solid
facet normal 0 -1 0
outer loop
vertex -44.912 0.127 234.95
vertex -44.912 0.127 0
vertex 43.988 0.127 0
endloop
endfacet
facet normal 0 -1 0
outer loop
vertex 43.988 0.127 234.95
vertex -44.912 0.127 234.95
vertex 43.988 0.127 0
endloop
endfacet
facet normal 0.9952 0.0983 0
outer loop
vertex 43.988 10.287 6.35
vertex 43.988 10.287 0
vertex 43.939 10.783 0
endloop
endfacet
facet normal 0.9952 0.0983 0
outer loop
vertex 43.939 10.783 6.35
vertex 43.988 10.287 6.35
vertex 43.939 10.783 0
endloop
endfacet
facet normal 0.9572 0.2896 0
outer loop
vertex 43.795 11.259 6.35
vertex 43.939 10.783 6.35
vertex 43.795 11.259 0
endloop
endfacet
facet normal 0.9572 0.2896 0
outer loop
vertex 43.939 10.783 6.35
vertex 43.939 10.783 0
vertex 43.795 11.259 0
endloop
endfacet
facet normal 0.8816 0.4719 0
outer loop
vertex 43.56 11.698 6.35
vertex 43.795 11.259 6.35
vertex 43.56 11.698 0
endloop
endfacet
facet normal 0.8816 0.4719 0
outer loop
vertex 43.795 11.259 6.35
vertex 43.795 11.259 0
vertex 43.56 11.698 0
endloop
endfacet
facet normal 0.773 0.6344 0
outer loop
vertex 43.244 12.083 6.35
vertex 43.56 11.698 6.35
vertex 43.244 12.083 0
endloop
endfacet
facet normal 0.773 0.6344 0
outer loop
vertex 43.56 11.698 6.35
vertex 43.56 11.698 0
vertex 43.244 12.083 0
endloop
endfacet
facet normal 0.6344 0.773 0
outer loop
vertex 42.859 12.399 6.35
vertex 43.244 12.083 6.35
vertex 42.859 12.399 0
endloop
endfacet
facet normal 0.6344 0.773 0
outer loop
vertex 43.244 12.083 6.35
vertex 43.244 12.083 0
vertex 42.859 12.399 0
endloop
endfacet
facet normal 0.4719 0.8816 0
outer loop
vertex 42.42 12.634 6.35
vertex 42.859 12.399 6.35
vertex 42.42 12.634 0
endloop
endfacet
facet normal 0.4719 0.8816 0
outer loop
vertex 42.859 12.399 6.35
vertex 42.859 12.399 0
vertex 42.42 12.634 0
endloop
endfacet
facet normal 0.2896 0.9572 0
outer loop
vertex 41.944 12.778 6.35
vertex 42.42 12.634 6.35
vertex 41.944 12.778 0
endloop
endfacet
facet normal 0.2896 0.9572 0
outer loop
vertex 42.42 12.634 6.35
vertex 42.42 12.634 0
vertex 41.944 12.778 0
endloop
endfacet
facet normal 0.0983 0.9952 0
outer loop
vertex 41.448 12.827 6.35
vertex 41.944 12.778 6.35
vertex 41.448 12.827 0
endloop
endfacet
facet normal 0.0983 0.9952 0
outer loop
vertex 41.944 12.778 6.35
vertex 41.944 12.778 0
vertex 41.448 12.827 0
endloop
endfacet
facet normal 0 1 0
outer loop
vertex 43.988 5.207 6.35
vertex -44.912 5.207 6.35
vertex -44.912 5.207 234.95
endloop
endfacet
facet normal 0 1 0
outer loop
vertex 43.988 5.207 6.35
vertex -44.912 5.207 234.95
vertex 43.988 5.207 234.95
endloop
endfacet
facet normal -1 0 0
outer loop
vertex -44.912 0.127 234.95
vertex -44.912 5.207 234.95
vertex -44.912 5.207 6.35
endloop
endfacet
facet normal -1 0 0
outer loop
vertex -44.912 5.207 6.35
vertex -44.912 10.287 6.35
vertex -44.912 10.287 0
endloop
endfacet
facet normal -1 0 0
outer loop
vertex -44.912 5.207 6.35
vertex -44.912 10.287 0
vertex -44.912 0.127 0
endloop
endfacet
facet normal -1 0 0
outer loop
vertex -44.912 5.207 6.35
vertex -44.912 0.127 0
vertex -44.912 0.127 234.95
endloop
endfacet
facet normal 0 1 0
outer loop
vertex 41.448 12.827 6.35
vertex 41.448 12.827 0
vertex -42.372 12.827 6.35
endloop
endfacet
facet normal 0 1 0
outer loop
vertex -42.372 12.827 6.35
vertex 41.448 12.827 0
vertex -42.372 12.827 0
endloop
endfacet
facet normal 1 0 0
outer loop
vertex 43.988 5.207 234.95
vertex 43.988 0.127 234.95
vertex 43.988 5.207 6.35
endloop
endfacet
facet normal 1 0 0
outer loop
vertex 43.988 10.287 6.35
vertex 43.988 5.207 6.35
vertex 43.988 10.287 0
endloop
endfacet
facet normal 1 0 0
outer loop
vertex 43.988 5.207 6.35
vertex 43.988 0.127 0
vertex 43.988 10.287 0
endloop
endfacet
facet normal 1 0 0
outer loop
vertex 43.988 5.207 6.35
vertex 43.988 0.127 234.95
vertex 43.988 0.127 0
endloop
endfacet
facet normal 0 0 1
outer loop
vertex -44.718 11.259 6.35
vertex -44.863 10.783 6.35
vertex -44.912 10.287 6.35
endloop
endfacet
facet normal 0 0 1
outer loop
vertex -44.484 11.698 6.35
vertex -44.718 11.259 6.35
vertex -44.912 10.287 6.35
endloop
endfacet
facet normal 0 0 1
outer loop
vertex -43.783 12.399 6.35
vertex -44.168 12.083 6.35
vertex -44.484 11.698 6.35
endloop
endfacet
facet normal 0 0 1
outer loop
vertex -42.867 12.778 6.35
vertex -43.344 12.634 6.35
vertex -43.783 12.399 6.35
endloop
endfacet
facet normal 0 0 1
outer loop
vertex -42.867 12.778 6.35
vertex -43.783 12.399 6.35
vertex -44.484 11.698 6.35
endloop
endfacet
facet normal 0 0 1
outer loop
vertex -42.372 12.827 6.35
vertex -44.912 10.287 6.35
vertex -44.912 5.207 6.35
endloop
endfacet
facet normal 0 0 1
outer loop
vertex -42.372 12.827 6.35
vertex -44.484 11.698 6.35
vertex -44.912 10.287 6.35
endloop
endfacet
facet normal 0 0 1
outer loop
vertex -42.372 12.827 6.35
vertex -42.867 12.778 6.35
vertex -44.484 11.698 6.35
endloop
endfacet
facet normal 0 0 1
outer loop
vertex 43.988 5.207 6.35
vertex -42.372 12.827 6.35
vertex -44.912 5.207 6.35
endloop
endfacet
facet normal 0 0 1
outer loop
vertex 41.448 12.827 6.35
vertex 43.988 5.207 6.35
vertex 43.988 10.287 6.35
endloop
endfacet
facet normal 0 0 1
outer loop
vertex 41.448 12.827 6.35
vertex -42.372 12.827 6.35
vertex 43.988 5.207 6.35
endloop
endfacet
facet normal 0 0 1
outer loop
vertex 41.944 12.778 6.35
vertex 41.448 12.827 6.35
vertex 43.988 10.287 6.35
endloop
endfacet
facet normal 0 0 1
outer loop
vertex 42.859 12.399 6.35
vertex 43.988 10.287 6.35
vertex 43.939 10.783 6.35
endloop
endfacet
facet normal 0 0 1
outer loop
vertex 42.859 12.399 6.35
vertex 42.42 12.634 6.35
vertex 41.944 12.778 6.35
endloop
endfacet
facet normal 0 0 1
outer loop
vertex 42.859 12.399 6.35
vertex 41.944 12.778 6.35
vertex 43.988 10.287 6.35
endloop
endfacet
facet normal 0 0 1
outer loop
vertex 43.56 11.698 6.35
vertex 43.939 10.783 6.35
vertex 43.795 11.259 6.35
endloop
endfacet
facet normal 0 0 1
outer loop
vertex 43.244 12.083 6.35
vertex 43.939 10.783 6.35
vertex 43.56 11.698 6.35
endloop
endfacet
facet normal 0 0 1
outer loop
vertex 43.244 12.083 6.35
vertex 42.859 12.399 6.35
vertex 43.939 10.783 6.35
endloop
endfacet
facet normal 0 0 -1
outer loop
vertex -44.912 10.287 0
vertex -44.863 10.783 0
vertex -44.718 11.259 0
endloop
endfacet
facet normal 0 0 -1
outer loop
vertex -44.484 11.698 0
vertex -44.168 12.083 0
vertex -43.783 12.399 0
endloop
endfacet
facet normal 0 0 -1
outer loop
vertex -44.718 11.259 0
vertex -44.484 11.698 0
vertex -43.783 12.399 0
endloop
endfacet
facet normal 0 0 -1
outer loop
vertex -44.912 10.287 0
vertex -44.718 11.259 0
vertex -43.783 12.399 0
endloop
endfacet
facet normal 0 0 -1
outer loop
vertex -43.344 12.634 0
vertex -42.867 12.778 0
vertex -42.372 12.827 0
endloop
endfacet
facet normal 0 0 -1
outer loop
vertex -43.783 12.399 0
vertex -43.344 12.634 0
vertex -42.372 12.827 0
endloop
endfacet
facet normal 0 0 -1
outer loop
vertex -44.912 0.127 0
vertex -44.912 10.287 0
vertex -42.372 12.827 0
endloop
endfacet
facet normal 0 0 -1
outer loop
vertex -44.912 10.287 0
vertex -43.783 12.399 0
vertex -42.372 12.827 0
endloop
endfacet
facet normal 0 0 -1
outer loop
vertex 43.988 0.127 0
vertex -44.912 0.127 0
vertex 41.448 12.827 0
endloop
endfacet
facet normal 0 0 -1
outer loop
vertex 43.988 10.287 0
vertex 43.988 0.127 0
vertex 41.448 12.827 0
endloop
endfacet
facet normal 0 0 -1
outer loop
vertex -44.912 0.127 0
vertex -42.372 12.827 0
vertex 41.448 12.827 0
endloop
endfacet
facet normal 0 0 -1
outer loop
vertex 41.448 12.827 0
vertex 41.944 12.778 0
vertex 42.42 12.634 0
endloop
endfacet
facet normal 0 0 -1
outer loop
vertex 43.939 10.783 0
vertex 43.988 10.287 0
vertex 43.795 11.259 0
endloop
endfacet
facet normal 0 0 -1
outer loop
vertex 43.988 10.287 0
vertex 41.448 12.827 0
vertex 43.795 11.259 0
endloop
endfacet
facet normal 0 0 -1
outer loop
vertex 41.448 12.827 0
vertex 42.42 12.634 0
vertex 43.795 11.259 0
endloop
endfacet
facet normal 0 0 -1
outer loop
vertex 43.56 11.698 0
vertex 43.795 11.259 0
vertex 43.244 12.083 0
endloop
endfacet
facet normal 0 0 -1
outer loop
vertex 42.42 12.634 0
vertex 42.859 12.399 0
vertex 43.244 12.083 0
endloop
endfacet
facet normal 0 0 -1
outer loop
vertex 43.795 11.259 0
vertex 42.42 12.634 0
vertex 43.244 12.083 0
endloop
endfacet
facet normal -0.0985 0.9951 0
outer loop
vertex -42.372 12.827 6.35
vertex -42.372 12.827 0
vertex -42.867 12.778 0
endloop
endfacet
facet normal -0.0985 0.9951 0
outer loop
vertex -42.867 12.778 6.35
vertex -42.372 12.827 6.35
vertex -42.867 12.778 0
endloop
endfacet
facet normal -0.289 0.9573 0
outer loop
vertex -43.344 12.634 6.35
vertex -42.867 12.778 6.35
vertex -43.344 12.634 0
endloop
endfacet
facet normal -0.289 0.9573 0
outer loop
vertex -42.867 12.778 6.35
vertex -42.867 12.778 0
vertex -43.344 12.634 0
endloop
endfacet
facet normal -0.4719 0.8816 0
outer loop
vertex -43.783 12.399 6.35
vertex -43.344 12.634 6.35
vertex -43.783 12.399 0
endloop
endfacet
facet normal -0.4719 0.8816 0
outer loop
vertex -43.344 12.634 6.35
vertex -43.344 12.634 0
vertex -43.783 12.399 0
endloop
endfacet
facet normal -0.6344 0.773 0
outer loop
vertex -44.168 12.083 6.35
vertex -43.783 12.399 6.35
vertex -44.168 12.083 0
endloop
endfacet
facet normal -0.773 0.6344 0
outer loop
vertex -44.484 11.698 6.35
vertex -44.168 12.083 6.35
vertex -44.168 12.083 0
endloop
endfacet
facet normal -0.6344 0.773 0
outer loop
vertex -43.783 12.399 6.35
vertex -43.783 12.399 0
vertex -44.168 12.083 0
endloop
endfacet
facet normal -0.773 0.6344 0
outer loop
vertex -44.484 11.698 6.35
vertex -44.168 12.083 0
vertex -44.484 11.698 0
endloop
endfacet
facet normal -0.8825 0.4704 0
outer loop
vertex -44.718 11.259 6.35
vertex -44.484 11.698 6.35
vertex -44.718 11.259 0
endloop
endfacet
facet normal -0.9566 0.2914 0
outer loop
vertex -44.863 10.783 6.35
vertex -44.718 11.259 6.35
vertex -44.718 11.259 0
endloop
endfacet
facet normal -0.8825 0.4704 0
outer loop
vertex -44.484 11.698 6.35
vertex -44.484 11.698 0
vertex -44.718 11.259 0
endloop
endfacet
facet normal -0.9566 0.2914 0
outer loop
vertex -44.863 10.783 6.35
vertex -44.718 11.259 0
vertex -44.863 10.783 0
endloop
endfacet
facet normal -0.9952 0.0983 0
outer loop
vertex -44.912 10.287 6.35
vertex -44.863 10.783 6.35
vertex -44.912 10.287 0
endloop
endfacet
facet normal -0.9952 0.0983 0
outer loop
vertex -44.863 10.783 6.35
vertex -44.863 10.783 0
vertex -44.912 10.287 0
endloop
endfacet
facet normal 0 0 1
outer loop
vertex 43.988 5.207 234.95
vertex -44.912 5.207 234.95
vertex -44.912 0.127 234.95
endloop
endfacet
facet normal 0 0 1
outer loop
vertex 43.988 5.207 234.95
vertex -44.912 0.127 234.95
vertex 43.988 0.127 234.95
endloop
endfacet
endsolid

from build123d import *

# Parameters (mm, degrees)
SLIDING_DOOR_HOLDER_DEPTH = 6.35
SKETCH1_5_W               = 88.9
SKETCH1_5_H               = 5.08
SLIDING_DOOR_DEPTH        = 234.95


with BuildPart() as part:
    # Sliding Door Sketch → Sliding Door Holder (new body)
    with BuildSketch(Plane.XY):
        with BuildLine():
            Line((-44.91175508, 0.127), (43.98824492, 0.127))
            Line((43.98824492, 0.127), (43.98824492, 10.287))
            ThreePointArc((43.98824492, 10.287), (43.244296144, 12.083051224), (41.44824492, 12.827))
            Line((41.44824492, 12.827), (-42.37175508, 12.827))
            ThreePointArc((-42.37175508, 12.827), (-44.167806304, 12.083051224), (-44.91175508, 10.287))
            Line((-44.91175508, 10.287), (-44.91175508, 0.127))
        make_face()
    extrude(amount=SLIDING_DOOR_HOLDER_DEPTH)

    # Sketch1<5> → Sliding Door (add)
    with BuildSketch(Plane.XY):
        with Locations((-0.46175508, 2.667)):
            Rectangle(SKETCH1_5_W, SKETCH1_5_H)
    extrude(amount=SLIDING_DOOR_DEPTH)


solid = part.part
